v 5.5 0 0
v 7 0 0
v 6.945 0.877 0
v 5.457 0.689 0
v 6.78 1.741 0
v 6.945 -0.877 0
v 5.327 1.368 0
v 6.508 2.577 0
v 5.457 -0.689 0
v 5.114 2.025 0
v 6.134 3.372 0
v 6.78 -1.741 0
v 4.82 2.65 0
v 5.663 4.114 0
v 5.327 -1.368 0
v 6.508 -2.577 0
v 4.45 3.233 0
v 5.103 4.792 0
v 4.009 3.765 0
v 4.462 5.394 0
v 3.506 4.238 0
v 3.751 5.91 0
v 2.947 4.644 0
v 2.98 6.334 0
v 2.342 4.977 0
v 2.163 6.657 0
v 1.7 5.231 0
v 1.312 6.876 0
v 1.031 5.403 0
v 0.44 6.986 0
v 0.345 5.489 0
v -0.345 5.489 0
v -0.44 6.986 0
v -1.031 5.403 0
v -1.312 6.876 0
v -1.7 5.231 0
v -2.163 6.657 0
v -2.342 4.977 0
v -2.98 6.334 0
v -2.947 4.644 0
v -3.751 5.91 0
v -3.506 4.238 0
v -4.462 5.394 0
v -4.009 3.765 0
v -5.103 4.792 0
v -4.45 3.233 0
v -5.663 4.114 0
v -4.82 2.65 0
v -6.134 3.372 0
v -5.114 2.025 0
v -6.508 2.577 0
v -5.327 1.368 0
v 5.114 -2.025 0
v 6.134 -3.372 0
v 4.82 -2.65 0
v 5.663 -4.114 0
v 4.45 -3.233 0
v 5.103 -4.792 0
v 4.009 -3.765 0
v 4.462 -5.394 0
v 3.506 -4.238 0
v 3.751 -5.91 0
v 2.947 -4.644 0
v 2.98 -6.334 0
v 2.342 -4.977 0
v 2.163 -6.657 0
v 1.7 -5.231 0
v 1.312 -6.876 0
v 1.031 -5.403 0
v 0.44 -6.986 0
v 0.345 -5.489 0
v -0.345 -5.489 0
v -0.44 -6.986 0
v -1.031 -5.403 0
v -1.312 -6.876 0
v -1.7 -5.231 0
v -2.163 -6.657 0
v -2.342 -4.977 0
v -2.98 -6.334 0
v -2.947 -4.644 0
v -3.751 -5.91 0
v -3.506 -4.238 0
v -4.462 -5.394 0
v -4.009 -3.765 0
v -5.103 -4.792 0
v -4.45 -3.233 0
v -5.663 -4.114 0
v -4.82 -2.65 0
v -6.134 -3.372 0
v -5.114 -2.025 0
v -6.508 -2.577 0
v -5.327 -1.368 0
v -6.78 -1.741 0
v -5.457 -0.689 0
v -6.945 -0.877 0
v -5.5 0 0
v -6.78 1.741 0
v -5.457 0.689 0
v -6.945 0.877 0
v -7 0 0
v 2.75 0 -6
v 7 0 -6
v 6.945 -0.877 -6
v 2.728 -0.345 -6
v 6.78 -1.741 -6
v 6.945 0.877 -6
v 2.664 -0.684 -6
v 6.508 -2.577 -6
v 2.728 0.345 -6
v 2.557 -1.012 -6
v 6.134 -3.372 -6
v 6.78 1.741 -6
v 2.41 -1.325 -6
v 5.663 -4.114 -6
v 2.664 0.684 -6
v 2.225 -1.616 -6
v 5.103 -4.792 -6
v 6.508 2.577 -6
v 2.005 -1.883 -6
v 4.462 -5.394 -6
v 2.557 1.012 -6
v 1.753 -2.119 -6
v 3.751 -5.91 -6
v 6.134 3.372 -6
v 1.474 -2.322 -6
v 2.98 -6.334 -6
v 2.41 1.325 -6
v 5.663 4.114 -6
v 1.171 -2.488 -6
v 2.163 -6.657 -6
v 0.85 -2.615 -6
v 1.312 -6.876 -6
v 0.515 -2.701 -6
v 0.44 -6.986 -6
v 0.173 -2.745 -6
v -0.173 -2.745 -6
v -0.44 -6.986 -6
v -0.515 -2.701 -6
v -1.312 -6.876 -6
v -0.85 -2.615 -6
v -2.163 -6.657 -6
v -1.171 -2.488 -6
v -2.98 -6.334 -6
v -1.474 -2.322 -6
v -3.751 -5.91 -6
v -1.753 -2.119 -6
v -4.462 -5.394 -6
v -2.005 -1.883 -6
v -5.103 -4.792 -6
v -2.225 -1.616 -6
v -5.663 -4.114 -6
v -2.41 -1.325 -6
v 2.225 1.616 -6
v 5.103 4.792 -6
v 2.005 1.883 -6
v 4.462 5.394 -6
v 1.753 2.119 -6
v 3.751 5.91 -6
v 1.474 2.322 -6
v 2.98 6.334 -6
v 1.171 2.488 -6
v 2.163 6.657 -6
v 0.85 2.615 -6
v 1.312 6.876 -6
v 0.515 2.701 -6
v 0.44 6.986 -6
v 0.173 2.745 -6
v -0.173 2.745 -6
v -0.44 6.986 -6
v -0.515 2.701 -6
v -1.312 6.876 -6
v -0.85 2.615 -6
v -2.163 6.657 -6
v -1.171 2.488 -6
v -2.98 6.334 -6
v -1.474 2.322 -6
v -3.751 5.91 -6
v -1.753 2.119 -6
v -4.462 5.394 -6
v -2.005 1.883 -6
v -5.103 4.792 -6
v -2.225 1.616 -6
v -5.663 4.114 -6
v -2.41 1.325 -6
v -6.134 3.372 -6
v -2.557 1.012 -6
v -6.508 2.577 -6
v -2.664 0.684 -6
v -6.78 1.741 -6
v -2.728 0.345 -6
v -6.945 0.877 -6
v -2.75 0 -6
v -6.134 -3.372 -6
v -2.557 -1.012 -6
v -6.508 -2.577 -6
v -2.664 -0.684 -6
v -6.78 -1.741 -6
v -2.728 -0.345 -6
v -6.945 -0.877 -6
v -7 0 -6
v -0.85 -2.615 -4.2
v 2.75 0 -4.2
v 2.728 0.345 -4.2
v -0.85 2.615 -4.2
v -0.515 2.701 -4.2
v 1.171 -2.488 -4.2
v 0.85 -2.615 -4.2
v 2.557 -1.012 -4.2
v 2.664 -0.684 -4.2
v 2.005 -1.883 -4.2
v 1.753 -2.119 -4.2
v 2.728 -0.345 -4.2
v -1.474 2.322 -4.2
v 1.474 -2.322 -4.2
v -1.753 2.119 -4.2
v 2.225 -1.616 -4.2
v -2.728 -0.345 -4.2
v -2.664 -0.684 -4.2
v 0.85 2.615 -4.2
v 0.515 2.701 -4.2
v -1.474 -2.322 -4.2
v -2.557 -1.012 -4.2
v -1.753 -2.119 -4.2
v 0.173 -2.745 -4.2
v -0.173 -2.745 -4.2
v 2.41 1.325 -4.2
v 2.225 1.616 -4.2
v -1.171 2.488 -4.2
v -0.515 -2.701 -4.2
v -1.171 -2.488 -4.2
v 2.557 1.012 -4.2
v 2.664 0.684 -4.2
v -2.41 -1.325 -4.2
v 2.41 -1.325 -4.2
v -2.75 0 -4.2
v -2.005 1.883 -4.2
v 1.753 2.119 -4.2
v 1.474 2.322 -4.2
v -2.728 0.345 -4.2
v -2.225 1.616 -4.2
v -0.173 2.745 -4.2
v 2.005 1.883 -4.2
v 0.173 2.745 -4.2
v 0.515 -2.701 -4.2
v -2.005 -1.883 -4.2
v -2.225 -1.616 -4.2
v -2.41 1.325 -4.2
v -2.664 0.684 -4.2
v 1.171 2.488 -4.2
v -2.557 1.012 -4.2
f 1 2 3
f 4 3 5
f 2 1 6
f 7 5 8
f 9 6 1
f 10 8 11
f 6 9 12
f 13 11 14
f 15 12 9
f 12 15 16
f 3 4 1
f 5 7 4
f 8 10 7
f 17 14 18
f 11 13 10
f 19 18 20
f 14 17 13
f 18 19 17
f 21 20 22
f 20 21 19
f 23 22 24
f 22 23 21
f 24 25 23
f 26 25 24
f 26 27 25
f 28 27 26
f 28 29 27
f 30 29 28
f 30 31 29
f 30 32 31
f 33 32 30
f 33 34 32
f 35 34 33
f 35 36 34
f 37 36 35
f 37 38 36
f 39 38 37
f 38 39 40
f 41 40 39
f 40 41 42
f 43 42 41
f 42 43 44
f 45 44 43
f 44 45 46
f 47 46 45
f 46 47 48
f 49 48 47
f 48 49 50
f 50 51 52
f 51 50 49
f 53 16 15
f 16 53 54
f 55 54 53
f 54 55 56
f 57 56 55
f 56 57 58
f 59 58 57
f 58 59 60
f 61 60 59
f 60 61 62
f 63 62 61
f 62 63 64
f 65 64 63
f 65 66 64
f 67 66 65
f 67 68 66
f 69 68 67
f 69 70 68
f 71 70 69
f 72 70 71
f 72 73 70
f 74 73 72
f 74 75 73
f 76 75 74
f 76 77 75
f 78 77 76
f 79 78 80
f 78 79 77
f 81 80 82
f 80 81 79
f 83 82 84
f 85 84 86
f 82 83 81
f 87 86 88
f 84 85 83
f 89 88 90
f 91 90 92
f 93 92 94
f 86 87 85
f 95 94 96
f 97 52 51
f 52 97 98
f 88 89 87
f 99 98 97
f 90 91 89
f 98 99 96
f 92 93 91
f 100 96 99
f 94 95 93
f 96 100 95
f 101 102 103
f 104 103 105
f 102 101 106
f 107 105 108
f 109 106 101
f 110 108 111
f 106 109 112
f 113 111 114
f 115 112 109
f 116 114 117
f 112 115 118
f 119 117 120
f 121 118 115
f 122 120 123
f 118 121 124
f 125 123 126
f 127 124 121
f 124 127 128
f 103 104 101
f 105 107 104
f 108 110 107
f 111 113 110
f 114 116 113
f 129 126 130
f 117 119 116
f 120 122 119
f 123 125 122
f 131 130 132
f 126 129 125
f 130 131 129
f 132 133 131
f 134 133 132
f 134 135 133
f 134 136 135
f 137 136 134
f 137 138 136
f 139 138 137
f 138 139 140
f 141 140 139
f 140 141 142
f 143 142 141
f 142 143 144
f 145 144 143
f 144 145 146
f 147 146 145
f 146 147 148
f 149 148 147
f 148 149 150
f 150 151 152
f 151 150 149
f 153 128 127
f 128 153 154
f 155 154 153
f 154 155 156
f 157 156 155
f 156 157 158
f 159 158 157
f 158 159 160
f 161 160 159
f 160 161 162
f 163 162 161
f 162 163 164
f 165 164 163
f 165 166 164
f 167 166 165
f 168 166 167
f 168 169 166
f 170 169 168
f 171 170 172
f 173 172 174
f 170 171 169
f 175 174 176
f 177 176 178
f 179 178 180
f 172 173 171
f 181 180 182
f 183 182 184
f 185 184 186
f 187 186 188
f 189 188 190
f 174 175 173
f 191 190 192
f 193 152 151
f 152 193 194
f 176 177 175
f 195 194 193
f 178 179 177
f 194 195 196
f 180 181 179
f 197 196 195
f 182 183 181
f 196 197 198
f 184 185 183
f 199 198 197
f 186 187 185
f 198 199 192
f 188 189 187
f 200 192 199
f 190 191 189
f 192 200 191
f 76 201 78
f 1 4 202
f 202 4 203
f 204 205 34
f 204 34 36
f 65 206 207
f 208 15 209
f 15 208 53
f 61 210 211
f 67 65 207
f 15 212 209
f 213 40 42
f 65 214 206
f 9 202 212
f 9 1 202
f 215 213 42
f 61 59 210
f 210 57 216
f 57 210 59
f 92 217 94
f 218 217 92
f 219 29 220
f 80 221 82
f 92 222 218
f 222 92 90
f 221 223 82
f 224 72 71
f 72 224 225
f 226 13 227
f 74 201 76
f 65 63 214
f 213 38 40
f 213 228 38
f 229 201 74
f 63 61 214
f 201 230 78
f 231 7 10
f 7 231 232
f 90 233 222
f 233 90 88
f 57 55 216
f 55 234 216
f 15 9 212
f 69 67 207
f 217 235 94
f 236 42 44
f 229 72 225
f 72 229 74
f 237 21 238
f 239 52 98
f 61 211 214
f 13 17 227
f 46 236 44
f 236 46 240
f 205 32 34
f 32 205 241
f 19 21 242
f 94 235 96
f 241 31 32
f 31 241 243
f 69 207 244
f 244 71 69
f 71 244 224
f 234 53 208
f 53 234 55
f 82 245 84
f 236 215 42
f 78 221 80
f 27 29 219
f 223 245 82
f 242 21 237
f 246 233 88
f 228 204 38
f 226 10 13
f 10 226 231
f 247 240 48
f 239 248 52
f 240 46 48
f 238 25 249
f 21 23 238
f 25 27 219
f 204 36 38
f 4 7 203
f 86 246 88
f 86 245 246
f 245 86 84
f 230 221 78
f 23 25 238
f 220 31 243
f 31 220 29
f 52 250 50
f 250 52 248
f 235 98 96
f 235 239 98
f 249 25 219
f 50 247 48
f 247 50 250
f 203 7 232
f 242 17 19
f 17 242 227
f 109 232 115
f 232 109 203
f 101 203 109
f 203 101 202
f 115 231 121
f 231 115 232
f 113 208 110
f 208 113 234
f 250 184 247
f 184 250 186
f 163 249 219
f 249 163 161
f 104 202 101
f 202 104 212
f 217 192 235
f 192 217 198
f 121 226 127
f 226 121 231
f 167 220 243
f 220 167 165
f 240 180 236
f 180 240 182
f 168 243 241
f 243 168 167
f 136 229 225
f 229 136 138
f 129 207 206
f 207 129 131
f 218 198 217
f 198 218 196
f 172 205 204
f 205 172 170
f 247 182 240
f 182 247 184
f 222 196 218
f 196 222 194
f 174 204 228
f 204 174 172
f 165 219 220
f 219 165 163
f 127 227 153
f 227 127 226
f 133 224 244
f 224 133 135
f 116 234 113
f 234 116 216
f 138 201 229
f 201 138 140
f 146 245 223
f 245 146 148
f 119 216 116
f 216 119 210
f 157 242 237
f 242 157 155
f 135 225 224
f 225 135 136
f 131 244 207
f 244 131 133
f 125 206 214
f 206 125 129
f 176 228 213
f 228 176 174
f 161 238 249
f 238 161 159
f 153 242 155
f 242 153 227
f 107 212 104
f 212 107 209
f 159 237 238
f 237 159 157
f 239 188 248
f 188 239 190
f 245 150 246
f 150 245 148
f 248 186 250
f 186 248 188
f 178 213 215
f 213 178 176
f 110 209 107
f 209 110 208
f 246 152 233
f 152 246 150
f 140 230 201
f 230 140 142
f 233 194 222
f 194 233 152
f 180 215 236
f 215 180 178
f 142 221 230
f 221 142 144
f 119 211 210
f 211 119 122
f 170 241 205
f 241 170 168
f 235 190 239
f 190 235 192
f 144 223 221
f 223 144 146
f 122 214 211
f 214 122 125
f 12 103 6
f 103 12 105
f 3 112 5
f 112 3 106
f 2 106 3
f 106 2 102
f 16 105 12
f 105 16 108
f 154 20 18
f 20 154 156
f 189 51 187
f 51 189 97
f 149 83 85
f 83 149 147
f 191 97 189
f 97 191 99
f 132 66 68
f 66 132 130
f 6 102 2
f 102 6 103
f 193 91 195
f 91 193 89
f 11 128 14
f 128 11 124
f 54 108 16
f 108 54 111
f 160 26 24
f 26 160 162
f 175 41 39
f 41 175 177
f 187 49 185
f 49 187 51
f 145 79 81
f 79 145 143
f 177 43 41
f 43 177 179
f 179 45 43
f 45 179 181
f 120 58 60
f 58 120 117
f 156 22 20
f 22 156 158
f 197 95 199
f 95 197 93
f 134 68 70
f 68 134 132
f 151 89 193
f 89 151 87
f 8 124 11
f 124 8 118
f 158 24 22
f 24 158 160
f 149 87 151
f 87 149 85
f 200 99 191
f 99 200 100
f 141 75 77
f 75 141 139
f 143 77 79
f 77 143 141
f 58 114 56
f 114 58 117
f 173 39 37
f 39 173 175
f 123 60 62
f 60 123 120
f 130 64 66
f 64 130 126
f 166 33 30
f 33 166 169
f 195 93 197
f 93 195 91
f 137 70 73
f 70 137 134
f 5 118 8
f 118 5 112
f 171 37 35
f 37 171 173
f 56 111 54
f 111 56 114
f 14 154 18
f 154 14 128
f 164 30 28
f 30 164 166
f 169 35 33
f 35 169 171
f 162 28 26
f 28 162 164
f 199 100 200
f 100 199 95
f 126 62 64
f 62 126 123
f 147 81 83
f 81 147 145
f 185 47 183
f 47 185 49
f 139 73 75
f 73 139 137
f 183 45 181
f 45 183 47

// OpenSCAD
$fn = 50;


difference() {
	union() {
		translate(v = [0, 0, -6.0000000000]) {
			cylinder(h = 6, r = 7.0000000000);
		}
		cylinder(h = 0, r = 13.0000000000);
	}
	union() {
		translate(v = [0, 0, 0]) {
			rotate(a = [0, 0, 0]) {
				difference() {
					union() {
						#translate(v = [0, 0, -6.0000000000]) {
							cylinder(h = 6, r = 2.2500000000);
						}
						#translate(v = [0, 0, -4.2000000000]) {
							cylinder(h = 4.2000000000, r = 7.0000000000, r1 = 2.7500000000, r2 = 5.5000000000);
						}
						#translate(v = [0, 0, -6.0000000000]) {
							cylinder(h = 6, r = 2.7500000000);
						}
						#translate(v = [0, 0, -6.0000000000]) {
							cylinder(h = 6, r = 2.2500000000);
						}
					}
					union();
				}
			}
		}
	}
}
